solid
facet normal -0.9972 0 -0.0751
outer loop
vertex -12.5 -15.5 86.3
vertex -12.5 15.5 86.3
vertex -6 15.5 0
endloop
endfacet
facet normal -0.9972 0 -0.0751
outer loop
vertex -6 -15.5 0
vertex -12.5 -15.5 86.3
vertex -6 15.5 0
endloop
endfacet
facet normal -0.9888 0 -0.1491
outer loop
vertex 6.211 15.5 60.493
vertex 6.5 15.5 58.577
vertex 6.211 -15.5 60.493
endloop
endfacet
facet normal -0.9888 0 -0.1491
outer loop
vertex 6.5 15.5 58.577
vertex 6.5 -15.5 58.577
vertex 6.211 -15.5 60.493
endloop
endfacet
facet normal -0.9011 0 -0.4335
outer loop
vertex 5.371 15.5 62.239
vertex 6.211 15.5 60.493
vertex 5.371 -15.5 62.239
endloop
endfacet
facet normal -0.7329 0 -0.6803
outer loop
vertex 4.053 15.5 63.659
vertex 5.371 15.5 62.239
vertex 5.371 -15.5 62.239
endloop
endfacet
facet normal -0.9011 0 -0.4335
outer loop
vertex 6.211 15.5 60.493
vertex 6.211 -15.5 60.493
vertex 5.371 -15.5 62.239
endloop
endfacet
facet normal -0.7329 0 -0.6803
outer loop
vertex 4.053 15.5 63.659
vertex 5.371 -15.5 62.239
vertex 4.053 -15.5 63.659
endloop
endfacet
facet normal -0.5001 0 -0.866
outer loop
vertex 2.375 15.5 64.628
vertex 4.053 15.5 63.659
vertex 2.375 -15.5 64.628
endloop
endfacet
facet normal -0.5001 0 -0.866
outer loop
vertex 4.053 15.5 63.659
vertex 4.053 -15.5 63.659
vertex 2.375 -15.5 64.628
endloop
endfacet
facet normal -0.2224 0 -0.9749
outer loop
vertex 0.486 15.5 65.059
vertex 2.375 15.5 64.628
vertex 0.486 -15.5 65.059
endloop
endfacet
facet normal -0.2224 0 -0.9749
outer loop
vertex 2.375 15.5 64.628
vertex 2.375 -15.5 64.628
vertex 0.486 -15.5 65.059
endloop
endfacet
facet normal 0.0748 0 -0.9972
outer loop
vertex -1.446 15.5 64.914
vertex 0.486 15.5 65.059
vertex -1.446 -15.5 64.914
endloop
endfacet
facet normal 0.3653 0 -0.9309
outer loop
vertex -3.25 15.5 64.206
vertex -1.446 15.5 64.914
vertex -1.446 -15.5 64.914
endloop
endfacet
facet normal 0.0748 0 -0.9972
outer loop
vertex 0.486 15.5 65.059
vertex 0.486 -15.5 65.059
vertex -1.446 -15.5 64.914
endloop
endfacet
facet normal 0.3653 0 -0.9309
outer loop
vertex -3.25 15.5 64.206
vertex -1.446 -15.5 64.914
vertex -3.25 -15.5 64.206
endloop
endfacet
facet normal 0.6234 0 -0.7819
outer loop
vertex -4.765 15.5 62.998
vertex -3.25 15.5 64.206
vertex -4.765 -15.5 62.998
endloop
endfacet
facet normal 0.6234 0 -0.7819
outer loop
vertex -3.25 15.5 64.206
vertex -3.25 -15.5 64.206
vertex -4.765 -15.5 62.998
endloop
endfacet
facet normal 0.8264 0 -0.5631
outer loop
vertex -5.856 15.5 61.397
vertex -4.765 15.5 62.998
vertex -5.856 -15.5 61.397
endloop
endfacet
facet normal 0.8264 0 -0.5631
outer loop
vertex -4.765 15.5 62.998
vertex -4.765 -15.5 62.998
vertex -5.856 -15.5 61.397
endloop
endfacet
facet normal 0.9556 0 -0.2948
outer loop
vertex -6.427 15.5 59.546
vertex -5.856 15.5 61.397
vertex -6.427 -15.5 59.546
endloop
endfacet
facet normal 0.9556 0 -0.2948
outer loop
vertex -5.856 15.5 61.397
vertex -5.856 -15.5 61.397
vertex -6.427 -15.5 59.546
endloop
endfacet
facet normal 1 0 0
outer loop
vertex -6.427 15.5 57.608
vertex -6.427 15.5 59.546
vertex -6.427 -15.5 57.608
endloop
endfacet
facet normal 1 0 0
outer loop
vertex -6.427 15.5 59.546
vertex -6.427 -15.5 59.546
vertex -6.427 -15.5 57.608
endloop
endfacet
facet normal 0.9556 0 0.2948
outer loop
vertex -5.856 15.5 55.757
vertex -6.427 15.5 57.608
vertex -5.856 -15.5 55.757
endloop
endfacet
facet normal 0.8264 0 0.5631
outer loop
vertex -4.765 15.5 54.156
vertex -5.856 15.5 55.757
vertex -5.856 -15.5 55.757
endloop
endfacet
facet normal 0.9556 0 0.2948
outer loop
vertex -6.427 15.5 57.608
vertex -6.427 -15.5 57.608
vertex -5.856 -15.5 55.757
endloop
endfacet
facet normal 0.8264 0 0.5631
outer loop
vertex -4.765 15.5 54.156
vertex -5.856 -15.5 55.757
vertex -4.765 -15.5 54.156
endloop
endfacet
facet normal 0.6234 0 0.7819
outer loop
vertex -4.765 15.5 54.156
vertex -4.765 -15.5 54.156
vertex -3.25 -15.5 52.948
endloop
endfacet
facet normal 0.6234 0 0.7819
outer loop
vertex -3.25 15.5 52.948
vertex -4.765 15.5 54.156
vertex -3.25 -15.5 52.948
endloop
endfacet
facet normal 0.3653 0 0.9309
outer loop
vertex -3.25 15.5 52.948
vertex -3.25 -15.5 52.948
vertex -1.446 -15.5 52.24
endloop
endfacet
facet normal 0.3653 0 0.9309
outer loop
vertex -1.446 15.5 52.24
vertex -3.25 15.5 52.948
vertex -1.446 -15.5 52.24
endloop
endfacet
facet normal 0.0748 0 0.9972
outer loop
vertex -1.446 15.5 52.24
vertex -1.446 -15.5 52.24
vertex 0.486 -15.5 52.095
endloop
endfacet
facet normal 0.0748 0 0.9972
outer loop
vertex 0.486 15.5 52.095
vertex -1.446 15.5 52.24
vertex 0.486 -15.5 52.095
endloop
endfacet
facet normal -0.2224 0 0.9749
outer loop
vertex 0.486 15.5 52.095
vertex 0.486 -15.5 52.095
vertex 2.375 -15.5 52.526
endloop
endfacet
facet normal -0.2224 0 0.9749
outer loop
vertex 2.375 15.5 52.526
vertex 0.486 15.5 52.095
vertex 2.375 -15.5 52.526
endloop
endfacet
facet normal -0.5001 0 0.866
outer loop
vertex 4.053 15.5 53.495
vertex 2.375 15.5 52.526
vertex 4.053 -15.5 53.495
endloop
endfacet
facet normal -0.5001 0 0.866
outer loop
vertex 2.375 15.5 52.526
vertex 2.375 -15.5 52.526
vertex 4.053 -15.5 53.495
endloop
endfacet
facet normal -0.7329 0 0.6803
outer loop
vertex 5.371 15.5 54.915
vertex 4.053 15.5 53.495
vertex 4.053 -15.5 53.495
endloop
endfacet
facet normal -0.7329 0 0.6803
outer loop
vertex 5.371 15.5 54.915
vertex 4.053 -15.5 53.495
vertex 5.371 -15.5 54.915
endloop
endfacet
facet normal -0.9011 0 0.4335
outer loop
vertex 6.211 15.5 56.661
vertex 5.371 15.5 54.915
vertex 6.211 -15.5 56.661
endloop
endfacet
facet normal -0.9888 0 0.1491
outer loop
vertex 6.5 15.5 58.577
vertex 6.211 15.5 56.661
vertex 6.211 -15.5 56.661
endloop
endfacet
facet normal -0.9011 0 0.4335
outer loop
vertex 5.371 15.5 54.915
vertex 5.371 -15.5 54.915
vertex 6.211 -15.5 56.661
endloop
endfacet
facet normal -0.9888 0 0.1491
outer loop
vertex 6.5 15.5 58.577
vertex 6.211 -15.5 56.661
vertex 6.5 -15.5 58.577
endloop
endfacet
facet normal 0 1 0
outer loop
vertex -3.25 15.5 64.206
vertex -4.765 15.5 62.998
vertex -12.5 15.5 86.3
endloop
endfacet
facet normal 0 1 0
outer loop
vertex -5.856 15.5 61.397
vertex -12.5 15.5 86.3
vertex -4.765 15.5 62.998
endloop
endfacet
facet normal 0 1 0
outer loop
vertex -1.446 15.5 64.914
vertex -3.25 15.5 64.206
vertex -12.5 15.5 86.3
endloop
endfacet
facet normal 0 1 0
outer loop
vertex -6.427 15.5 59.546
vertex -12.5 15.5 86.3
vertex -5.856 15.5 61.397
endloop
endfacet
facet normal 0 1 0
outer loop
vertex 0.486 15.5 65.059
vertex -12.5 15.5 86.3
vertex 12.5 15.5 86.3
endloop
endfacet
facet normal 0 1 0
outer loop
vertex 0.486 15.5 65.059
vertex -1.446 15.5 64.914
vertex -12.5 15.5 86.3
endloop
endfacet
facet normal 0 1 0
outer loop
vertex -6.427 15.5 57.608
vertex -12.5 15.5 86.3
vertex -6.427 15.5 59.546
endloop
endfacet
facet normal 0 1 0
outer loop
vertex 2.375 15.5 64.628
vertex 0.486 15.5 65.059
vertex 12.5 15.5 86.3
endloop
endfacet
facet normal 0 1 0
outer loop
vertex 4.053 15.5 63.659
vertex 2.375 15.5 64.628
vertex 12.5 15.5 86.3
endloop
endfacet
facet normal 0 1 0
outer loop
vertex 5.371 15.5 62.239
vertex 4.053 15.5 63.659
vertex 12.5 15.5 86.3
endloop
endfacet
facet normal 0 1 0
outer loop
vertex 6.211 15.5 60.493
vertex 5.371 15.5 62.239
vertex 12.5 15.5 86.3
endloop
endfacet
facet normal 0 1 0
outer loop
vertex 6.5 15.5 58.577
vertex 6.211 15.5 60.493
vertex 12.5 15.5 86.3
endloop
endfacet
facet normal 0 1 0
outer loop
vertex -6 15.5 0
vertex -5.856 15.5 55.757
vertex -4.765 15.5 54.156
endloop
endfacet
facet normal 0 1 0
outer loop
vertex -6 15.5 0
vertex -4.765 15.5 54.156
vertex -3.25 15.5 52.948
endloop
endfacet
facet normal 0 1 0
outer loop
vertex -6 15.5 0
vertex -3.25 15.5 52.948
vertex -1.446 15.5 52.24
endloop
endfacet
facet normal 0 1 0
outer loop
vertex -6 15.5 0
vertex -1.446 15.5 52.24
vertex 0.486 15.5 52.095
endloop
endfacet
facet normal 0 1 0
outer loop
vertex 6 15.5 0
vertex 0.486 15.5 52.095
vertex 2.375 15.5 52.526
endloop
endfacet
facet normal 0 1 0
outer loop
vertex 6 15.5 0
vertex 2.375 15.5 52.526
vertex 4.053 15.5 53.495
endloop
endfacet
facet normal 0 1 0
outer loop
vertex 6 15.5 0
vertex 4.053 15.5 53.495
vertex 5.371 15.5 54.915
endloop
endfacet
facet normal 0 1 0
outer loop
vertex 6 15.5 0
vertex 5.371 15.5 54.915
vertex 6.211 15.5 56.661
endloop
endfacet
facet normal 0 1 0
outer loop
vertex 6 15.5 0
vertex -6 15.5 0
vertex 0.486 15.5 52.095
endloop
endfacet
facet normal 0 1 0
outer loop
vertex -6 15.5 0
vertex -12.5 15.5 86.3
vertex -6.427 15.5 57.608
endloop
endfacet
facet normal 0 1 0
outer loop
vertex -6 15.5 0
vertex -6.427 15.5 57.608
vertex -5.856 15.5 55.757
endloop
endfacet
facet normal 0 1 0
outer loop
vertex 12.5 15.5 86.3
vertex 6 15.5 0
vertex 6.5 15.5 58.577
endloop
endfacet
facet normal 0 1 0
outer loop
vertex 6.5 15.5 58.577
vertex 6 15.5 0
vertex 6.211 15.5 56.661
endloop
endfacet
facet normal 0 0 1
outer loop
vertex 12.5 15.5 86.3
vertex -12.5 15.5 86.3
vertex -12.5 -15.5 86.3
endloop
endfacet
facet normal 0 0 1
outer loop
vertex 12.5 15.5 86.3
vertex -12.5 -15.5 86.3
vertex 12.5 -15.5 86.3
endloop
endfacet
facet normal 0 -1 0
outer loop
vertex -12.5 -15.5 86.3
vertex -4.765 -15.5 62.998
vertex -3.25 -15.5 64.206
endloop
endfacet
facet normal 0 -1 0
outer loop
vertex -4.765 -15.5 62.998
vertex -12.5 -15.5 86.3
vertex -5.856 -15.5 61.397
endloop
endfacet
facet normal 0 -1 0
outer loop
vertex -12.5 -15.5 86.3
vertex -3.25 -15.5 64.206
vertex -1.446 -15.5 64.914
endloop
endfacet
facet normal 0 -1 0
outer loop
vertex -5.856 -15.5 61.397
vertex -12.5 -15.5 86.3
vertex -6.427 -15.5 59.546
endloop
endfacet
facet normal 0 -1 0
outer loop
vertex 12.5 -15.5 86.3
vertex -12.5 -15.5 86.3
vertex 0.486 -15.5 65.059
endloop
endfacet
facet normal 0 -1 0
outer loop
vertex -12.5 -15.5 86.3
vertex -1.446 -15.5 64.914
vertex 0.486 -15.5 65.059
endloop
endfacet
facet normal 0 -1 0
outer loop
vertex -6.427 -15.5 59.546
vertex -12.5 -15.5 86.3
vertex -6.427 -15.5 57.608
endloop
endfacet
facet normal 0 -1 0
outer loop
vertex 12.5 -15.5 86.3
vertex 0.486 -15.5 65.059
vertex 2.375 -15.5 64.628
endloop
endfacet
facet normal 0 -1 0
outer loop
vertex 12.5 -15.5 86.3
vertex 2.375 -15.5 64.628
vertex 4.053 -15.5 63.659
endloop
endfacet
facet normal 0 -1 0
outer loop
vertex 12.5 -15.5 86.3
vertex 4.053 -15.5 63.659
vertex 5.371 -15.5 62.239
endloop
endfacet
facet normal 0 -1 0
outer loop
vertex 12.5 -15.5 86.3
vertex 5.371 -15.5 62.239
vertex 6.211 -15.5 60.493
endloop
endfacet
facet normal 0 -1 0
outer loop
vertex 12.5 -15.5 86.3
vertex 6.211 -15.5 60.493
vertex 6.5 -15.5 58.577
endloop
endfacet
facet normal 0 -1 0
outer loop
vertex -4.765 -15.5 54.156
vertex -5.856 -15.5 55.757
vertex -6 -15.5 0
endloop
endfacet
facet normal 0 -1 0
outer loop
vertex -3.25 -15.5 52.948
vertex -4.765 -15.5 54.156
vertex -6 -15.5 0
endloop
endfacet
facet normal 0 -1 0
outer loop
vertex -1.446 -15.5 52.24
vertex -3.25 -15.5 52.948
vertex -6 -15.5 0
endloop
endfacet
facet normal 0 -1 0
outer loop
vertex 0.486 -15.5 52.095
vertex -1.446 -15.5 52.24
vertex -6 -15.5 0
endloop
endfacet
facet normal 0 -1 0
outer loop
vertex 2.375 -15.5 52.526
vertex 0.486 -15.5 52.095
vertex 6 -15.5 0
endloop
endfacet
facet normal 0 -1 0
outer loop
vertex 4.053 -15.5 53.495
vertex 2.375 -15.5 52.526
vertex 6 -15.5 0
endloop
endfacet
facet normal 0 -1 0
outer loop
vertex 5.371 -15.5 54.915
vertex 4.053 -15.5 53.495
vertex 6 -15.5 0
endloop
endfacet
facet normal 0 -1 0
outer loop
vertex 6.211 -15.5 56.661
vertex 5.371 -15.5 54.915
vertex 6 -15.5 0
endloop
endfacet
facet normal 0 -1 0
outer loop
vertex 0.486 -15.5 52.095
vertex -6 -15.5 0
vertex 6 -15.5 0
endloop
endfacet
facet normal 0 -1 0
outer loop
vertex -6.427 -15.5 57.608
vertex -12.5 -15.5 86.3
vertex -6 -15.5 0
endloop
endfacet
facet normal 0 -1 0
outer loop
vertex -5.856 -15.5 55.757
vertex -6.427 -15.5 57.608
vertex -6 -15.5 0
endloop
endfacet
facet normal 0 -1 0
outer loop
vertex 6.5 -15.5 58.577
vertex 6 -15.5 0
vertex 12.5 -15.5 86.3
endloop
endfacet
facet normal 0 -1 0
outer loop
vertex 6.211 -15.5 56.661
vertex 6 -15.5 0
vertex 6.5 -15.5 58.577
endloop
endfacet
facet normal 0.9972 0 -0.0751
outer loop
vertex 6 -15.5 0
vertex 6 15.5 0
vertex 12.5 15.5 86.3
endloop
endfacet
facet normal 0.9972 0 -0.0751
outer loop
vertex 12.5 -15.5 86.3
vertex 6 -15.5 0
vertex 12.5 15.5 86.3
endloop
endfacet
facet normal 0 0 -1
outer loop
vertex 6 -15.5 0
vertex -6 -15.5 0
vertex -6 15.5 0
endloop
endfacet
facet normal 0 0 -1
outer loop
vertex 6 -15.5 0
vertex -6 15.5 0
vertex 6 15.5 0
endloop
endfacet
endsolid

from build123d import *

# Parameters (mm, degrees)
F0_W     = 25
F0_H     = 31
F1_DEPTH = 86.3
F2_R     = 6.5
F3_DEPTH = 31.5
F5_DEPTH = 31.001


with BuildPart() as f1:
    # F0 (on Top) → F1 (new body)
    with BuildSketch(Plane.XY):
        Rectangle(F0_W, F0_H)
    extrude(amount=F1_DEPTH)

    # F2 (on Front) → F3 (cut, symmetric)
    with BuildSketch(Plane.XZ):
        with Locations((0, 58.577)):
            Circle(F2_R)
    extrude(amount=F3_DEPTH, both=True, mode=Mode.SUBTRACT)

    # F4 (on face) → F5 (cut, through all)
    with BuildSketch(Plane(origin=(0, 15.5, 0), x_dir=(-1, 0, 0), z_dir=(0, 1, 0))):
        Polygon((12.5, 0), (12.5, 86.3), (6, 0), align=None)
        Polygon((-6, 0), (-12.5, 86.3), (-12.5, 0), align=None)
    extrude(amount=-F5_DEPTH, mode=Mode.SUBTRACT)


solid = f1.part
